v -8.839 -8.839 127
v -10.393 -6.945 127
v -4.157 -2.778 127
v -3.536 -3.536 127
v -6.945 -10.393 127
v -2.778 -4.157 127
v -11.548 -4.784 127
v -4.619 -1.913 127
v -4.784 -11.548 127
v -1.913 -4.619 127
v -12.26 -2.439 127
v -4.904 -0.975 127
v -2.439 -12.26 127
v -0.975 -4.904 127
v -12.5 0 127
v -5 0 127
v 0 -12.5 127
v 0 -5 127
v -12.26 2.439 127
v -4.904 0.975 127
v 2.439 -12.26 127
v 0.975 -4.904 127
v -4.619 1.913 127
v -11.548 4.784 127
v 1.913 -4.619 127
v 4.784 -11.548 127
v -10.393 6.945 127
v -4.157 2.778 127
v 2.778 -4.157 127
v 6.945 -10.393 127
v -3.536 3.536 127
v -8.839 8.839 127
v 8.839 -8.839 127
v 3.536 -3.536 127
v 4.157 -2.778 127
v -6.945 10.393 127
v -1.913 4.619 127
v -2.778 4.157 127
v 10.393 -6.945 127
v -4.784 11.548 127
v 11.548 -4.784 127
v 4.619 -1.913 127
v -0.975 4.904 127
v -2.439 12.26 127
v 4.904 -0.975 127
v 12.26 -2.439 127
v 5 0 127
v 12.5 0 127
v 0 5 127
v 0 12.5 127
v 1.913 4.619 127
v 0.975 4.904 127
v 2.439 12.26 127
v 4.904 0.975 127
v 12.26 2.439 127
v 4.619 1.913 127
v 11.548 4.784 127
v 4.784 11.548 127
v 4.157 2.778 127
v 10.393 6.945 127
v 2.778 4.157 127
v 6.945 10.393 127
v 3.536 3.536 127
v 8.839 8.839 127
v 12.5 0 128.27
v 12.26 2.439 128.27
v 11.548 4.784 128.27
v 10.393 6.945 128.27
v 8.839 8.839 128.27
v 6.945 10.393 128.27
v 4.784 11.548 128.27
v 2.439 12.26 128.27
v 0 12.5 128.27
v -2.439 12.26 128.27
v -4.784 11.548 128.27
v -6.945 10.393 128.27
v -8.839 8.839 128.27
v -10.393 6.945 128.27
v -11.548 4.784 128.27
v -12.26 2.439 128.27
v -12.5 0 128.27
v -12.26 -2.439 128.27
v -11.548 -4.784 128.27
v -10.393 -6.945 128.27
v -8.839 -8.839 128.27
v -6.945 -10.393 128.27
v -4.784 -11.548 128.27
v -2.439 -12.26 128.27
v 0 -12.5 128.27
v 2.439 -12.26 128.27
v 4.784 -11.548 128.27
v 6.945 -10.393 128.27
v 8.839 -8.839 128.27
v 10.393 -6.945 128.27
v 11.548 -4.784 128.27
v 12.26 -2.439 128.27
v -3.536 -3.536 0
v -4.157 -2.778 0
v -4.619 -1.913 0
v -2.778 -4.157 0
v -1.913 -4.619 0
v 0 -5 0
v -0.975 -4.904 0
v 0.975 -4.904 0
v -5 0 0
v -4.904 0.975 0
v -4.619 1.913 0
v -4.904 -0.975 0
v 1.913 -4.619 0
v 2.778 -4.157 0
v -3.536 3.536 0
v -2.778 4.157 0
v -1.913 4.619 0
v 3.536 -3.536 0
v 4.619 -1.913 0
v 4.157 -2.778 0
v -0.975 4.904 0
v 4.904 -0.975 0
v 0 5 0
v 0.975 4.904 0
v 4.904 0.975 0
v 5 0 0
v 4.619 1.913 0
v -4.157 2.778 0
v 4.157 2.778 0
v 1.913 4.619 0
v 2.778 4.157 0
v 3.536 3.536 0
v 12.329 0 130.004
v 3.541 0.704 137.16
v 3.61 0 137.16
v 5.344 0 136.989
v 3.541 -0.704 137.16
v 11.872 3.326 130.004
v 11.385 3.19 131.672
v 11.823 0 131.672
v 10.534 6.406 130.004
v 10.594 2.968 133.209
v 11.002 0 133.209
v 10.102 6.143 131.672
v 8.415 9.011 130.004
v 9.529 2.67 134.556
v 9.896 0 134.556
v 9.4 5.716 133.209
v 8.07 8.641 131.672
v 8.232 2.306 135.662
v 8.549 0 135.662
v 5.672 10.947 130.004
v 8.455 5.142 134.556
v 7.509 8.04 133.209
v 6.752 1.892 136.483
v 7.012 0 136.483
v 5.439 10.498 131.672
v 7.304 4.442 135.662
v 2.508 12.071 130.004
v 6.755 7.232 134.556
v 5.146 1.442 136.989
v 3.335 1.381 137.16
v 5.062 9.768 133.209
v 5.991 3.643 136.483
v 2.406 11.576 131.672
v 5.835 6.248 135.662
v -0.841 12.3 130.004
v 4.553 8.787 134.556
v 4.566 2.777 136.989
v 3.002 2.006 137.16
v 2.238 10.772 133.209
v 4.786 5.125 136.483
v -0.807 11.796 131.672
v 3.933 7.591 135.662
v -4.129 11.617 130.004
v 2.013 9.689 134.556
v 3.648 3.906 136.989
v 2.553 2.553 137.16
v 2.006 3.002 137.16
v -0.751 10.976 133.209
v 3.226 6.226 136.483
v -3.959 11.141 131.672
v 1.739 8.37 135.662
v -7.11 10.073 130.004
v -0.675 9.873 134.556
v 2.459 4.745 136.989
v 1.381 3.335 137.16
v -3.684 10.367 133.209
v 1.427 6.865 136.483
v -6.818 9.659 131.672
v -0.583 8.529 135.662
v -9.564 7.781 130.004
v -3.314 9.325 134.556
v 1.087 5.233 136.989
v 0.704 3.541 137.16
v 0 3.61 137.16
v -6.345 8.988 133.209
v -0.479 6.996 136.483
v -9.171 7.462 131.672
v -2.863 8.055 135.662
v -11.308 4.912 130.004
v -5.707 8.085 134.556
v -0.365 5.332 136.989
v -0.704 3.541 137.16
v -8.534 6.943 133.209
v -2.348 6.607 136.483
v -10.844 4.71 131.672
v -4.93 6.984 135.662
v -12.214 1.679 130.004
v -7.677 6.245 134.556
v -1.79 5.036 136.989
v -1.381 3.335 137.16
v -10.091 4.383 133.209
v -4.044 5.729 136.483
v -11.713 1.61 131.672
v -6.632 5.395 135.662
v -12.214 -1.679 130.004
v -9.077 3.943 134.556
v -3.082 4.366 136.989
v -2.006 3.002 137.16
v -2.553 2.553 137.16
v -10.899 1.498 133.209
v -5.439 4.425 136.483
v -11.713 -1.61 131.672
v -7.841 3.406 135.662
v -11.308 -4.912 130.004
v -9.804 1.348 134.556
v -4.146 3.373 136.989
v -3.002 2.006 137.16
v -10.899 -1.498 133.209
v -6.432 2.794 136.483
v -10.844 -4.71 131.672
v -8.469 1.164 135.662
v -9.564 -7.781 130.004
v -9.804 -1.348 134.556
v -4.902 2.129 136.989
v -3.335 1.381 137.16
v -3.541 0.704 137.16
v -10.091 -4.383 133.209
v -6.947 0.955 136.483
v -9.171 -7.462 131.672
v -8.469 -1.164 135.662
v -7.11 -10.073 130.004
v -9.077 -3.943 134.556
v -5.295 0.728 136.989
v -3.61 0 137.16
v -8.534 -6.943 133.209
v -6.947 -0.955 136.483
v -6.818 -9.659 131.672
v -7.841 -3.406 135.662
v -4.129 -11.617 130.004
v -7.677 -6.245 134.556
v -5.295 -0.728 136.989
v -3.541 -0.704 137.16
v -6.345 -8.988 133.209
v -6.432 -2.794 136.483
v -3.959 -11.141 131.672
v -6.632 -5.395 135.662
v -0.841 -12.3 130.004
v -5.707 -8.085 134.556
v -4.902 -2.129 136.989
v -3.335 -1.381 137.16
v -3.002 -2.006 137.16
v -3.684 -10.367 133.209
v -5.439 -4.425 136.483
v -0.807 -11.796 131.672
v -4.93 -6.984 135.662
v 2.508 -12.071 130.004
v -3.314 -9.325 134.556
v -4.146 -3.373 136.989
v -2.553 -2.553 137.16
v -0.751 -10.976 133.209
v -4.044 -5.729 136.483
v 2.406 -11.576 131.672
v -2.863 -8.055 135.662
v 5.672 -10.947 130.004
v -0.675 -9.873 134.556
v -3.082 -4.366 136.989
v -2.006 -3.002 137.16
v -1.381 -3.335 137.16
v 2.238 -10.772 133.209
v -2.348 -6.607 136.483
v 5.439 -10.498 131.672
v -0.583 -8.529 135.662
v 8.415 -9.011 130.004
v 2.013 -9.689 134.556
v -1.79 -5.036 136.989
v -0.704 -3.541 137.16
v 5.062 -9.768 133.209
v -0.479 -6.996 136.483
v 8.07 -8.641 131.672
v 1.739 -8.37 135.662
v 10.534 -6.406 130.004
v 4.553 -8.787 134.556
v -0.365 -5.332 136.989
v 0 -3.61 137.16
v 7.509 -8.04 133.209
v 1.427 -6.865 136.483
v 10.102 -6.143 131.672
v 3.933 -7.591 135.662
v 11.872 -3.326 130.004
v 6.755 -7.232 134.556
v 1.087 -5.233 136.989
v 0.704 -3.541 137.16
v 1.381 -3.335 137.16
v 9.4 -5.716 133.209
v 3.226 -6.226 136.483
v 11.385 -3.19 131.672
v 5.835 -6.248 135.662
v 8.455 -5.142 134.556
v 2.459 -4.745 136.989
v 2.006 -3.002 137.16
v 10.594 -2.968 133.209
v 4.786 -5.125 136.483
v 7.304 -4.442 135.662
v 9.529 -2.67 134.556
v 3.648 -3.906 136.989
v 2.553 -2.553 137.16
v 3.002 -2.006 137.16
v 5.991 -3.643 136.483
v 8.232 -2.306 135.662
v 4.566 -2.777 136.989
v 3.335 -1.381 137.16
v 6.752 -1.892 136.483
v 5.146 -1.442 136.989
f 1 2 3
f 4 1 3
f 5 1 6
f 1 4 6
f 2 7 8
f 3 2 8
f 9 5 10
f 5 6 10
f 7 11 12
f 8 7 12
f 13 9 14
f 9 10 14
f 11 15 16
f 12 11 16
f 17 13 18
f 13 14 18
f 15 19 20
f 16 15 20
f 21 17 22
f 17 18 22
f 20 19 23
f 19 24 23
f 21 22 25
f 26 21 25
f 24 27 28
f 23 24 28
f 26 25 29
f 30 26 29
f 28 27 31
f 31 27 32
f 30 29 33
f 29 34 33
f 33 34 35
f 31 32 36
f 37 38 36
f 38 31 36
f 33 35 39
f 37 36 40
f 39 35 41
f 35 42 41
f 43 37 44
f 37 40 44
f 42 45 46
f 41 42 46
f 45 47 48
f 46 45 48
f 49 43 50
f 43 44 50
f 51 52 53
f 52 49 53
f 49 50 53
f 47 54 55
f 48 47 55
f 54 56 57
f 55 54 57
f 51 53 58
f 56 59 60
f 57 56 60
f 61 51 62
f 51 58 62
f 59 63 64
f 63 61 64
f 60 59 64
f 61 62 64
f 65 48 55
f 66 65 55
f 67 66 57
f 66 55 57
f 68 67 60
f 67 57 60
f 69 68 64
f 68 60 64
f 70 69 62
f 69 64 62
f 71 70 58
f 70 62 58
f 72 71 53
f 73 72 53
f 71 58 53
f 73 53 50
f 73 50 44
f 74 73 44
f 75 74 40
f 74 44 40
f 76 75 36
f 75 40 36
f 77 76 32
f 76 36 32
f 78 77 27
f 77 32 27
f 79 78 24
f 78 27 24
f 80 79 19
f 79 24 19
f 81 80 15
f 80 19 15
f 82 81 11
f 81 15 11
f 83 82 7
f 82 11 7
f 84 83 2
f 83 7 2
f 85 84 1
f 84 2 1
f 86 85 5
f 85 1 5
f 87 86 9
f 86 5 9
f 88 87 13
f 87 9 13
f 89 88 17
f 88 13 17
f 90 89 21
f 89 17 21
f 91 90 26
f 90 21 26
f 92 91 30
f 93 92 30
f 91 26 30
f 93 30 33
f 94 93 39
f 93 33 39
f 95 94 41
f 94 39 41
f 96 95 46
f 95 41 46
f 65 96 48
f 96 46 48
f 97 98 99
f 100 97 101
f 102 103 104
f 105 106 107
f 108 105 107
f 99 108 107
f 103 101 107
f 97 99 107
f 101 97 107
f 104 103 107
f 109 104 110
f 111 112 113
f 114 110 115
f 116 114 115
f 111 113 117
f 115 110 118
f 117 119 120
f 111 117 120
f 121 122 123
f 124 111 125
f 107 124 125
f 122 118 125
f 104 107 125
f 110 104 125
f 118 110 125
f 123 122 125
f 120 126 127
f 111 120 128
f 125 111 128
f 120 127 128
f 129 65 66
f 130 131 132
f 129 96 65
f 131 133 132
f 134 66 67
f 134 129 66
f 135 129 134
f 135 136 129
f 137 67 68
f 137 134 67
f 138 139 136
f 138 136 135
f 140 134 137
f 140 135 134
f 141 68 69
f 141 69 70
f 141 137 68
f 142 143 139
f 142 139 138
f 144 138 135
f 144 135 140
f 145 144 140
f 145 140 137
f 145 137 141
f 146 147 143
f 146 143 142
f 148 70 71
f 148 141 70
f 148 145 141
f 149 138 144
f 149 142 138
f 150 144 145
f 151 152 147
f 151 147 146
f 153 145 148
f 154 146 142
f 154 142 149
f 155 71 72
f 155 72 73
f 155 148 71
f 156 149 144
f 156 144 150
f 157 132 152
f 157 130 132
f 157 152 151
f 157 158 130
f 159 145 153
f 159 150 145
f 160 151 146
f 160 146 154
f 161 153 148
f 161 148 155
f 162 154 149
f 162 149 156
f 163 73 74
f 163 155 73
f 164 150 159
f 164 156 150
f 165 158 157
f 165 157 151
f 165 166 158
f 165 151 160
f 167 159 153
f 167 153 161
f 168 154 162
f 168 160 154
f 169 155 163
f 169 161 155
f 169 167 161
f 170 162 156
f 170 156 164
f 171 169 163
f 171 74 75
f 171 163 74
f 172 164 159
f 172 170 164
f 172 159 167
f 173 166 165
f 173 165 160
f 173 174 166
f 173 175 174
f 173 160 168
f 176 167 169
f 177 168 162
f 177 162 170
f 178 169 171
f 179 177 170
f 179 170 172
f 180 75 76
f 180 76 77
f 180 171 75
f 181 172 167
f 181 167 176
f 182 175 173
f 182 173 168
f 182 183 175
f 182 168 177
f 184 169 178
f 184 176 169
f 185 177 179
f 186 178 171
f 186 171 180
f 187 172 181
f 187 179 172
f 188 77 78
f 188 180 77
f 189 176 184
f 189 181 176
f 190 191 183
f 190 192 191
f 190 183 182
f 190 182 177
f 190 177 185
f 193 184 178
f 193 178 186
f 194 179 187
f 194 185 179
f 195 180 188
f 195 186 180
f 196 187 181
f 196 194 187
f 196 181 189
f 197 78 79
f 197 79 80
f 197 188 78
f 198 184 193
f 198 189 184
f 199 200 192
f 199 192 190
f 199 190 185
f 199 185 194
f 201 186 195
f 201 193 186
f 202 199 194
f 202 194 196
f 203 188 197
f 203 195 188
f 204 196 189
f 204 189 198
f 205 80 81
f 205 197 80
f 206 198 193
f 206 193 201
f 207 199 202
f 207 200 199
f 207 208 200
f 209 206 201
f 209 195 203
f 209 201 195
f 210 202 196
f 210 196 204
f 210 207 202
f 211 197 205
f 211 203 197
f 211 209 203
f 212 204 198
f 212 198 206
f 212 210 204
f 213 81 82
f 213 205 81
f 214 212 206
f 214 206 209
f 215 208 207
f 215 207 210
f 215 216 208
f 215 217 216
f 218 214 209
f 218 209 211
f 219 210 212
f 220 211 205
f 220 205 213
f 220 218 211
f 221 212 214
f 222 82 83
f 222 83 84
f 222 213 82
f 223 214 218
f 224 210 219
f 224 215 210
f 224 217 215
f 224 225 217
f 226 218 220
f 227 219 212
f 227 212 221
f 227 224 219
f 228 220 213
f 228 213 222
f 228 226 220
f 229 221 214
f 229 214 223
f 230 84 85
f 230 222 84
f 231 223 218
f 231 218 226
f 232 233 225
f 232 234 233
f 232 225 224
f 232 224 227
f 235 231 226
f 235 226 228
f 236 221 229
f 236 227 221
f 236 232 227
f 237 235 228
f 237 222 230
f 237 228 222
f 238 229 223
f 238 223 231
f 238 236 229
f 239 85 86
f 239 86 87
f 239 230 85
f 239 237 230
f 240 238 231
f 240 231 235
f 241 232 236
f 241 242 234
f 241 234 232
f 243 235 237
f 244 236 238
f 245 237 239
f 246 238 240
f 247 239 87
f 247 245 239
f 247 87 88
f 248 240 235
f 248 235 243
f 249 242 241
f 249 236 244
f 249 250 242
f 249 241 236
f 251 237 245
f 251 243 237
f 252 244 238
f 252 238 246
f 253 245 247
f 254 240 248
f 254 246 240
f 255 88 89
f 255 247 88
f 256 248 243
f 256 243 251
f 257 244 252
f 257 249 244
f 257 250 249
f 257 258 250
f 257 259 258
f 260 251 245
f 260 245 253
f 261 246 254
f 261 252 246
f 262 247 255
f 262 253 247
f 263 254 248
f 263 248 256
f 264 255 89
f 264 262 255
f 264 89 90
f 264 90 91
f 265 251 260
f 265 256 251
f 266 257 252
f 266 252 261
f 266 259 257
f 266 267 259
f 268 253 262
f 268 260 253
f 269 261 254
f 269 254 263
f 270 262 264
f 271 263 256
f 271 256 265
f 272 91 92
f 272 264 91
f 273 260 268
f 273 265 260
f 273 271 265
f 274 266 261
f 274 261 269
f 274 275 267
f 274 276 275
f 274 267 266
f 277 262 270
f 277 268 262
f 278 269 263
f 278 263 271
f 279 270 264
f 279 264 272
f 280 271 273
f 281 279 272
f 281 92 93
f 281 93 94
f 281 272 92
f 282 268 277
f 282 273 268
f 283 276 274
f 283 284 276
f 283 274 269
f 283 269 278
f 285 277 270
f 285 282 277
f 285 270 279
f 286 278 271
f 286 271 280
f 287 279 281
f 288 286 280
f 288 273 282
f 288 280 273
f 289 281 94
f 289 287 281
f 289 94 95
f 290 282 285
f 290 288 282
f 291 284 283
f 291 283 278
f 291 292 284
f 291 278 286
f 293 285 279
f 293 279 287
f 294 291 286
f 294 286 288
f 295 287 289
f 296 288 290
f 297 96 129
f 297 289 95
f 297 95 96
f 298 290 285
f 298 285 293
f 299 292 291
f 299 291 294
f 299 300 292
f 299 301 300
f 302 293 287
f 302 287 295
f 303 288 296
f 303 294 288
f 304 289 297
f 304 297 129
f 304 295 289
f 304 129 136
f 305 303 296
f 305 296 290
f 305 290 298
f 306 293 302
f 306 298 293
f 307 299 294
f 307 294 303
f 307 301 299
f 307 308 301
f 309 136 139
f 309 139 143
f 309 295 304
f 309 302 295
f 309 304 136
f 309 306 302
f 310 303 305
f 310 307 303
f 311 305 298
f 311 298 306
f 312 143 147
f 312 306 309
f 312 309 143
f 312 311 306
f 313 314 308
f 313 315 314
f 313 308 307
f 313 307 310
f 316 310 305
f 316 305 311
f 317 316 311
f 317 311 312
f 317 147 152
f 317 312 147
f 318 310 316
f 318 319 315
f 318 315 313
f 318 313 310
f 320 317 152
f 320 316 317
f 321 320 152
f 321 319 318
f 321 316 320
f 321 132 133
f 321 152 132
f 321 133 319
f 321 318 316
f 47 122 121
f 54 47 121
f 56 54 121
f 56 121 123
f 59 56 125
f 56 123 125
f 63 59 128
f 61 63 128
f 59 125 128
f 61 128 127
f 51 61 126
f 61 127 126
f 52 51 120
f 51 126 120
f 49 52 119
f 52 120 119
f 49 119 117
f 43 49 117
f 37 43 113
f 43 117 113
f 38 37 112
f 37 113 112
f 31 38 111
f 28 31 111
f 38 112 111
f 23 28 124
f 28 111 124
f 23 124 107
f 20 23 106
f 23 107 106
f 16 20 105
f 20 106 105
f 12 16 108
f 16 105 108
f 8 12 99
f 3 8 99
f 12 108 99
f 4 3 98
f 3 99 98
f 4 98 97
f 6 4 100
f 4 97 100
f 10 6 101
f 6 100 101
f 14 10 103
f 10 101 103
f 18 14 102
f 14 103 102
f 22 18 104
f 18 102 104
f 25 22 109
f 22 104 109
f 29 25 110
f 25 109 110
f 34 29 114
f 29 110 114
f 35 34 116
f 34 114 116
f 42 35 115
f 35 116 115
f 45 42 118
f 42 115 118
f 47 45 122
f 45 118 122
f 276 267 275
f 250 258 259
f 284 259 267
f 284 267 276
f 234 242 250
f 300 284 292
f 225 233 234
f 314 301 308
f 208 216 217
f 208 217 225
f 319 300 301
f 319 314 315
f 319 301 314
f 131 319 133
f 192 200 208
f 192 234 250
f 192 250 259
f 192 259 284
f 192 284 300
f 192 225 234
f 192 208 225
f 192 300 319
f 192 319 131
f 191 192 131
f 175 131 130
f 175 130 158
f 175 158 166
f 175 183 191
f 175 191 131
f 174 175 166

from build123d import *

# Parameters (mm, degrees)
F0_R     = 5
F1_DEPTH = 127
F2_R     = 12.5
F2_R_2   = 5
F3_DEPTH = 10.16
F4_R     = 8.89


with BuildPart() as f1:
    # F0 (on Top) → F1 (new body)
    with BuildSketch(Plane.XY):
        Circle(F0_R)
    extrude(amount=F1_DEPTH)

    # F2 (on face) → F3 (join)
    with BuildSketch(Plane.XY.offset(127)):
        Circle(F2_R)
        Circle(F2_R_2, mode=Mode.SUBTRACT)
        Circle(F2_R_2)
    extrude(amount=F3_DEPTH)

    # F4
    f4_edges = [f1.edges().sort_by_distance(p)[0] for p in [
        (-12.5, 0, 137.16),
    ]]
    fillet(f4_edges, radius=F4_R)


solid = f1.part
